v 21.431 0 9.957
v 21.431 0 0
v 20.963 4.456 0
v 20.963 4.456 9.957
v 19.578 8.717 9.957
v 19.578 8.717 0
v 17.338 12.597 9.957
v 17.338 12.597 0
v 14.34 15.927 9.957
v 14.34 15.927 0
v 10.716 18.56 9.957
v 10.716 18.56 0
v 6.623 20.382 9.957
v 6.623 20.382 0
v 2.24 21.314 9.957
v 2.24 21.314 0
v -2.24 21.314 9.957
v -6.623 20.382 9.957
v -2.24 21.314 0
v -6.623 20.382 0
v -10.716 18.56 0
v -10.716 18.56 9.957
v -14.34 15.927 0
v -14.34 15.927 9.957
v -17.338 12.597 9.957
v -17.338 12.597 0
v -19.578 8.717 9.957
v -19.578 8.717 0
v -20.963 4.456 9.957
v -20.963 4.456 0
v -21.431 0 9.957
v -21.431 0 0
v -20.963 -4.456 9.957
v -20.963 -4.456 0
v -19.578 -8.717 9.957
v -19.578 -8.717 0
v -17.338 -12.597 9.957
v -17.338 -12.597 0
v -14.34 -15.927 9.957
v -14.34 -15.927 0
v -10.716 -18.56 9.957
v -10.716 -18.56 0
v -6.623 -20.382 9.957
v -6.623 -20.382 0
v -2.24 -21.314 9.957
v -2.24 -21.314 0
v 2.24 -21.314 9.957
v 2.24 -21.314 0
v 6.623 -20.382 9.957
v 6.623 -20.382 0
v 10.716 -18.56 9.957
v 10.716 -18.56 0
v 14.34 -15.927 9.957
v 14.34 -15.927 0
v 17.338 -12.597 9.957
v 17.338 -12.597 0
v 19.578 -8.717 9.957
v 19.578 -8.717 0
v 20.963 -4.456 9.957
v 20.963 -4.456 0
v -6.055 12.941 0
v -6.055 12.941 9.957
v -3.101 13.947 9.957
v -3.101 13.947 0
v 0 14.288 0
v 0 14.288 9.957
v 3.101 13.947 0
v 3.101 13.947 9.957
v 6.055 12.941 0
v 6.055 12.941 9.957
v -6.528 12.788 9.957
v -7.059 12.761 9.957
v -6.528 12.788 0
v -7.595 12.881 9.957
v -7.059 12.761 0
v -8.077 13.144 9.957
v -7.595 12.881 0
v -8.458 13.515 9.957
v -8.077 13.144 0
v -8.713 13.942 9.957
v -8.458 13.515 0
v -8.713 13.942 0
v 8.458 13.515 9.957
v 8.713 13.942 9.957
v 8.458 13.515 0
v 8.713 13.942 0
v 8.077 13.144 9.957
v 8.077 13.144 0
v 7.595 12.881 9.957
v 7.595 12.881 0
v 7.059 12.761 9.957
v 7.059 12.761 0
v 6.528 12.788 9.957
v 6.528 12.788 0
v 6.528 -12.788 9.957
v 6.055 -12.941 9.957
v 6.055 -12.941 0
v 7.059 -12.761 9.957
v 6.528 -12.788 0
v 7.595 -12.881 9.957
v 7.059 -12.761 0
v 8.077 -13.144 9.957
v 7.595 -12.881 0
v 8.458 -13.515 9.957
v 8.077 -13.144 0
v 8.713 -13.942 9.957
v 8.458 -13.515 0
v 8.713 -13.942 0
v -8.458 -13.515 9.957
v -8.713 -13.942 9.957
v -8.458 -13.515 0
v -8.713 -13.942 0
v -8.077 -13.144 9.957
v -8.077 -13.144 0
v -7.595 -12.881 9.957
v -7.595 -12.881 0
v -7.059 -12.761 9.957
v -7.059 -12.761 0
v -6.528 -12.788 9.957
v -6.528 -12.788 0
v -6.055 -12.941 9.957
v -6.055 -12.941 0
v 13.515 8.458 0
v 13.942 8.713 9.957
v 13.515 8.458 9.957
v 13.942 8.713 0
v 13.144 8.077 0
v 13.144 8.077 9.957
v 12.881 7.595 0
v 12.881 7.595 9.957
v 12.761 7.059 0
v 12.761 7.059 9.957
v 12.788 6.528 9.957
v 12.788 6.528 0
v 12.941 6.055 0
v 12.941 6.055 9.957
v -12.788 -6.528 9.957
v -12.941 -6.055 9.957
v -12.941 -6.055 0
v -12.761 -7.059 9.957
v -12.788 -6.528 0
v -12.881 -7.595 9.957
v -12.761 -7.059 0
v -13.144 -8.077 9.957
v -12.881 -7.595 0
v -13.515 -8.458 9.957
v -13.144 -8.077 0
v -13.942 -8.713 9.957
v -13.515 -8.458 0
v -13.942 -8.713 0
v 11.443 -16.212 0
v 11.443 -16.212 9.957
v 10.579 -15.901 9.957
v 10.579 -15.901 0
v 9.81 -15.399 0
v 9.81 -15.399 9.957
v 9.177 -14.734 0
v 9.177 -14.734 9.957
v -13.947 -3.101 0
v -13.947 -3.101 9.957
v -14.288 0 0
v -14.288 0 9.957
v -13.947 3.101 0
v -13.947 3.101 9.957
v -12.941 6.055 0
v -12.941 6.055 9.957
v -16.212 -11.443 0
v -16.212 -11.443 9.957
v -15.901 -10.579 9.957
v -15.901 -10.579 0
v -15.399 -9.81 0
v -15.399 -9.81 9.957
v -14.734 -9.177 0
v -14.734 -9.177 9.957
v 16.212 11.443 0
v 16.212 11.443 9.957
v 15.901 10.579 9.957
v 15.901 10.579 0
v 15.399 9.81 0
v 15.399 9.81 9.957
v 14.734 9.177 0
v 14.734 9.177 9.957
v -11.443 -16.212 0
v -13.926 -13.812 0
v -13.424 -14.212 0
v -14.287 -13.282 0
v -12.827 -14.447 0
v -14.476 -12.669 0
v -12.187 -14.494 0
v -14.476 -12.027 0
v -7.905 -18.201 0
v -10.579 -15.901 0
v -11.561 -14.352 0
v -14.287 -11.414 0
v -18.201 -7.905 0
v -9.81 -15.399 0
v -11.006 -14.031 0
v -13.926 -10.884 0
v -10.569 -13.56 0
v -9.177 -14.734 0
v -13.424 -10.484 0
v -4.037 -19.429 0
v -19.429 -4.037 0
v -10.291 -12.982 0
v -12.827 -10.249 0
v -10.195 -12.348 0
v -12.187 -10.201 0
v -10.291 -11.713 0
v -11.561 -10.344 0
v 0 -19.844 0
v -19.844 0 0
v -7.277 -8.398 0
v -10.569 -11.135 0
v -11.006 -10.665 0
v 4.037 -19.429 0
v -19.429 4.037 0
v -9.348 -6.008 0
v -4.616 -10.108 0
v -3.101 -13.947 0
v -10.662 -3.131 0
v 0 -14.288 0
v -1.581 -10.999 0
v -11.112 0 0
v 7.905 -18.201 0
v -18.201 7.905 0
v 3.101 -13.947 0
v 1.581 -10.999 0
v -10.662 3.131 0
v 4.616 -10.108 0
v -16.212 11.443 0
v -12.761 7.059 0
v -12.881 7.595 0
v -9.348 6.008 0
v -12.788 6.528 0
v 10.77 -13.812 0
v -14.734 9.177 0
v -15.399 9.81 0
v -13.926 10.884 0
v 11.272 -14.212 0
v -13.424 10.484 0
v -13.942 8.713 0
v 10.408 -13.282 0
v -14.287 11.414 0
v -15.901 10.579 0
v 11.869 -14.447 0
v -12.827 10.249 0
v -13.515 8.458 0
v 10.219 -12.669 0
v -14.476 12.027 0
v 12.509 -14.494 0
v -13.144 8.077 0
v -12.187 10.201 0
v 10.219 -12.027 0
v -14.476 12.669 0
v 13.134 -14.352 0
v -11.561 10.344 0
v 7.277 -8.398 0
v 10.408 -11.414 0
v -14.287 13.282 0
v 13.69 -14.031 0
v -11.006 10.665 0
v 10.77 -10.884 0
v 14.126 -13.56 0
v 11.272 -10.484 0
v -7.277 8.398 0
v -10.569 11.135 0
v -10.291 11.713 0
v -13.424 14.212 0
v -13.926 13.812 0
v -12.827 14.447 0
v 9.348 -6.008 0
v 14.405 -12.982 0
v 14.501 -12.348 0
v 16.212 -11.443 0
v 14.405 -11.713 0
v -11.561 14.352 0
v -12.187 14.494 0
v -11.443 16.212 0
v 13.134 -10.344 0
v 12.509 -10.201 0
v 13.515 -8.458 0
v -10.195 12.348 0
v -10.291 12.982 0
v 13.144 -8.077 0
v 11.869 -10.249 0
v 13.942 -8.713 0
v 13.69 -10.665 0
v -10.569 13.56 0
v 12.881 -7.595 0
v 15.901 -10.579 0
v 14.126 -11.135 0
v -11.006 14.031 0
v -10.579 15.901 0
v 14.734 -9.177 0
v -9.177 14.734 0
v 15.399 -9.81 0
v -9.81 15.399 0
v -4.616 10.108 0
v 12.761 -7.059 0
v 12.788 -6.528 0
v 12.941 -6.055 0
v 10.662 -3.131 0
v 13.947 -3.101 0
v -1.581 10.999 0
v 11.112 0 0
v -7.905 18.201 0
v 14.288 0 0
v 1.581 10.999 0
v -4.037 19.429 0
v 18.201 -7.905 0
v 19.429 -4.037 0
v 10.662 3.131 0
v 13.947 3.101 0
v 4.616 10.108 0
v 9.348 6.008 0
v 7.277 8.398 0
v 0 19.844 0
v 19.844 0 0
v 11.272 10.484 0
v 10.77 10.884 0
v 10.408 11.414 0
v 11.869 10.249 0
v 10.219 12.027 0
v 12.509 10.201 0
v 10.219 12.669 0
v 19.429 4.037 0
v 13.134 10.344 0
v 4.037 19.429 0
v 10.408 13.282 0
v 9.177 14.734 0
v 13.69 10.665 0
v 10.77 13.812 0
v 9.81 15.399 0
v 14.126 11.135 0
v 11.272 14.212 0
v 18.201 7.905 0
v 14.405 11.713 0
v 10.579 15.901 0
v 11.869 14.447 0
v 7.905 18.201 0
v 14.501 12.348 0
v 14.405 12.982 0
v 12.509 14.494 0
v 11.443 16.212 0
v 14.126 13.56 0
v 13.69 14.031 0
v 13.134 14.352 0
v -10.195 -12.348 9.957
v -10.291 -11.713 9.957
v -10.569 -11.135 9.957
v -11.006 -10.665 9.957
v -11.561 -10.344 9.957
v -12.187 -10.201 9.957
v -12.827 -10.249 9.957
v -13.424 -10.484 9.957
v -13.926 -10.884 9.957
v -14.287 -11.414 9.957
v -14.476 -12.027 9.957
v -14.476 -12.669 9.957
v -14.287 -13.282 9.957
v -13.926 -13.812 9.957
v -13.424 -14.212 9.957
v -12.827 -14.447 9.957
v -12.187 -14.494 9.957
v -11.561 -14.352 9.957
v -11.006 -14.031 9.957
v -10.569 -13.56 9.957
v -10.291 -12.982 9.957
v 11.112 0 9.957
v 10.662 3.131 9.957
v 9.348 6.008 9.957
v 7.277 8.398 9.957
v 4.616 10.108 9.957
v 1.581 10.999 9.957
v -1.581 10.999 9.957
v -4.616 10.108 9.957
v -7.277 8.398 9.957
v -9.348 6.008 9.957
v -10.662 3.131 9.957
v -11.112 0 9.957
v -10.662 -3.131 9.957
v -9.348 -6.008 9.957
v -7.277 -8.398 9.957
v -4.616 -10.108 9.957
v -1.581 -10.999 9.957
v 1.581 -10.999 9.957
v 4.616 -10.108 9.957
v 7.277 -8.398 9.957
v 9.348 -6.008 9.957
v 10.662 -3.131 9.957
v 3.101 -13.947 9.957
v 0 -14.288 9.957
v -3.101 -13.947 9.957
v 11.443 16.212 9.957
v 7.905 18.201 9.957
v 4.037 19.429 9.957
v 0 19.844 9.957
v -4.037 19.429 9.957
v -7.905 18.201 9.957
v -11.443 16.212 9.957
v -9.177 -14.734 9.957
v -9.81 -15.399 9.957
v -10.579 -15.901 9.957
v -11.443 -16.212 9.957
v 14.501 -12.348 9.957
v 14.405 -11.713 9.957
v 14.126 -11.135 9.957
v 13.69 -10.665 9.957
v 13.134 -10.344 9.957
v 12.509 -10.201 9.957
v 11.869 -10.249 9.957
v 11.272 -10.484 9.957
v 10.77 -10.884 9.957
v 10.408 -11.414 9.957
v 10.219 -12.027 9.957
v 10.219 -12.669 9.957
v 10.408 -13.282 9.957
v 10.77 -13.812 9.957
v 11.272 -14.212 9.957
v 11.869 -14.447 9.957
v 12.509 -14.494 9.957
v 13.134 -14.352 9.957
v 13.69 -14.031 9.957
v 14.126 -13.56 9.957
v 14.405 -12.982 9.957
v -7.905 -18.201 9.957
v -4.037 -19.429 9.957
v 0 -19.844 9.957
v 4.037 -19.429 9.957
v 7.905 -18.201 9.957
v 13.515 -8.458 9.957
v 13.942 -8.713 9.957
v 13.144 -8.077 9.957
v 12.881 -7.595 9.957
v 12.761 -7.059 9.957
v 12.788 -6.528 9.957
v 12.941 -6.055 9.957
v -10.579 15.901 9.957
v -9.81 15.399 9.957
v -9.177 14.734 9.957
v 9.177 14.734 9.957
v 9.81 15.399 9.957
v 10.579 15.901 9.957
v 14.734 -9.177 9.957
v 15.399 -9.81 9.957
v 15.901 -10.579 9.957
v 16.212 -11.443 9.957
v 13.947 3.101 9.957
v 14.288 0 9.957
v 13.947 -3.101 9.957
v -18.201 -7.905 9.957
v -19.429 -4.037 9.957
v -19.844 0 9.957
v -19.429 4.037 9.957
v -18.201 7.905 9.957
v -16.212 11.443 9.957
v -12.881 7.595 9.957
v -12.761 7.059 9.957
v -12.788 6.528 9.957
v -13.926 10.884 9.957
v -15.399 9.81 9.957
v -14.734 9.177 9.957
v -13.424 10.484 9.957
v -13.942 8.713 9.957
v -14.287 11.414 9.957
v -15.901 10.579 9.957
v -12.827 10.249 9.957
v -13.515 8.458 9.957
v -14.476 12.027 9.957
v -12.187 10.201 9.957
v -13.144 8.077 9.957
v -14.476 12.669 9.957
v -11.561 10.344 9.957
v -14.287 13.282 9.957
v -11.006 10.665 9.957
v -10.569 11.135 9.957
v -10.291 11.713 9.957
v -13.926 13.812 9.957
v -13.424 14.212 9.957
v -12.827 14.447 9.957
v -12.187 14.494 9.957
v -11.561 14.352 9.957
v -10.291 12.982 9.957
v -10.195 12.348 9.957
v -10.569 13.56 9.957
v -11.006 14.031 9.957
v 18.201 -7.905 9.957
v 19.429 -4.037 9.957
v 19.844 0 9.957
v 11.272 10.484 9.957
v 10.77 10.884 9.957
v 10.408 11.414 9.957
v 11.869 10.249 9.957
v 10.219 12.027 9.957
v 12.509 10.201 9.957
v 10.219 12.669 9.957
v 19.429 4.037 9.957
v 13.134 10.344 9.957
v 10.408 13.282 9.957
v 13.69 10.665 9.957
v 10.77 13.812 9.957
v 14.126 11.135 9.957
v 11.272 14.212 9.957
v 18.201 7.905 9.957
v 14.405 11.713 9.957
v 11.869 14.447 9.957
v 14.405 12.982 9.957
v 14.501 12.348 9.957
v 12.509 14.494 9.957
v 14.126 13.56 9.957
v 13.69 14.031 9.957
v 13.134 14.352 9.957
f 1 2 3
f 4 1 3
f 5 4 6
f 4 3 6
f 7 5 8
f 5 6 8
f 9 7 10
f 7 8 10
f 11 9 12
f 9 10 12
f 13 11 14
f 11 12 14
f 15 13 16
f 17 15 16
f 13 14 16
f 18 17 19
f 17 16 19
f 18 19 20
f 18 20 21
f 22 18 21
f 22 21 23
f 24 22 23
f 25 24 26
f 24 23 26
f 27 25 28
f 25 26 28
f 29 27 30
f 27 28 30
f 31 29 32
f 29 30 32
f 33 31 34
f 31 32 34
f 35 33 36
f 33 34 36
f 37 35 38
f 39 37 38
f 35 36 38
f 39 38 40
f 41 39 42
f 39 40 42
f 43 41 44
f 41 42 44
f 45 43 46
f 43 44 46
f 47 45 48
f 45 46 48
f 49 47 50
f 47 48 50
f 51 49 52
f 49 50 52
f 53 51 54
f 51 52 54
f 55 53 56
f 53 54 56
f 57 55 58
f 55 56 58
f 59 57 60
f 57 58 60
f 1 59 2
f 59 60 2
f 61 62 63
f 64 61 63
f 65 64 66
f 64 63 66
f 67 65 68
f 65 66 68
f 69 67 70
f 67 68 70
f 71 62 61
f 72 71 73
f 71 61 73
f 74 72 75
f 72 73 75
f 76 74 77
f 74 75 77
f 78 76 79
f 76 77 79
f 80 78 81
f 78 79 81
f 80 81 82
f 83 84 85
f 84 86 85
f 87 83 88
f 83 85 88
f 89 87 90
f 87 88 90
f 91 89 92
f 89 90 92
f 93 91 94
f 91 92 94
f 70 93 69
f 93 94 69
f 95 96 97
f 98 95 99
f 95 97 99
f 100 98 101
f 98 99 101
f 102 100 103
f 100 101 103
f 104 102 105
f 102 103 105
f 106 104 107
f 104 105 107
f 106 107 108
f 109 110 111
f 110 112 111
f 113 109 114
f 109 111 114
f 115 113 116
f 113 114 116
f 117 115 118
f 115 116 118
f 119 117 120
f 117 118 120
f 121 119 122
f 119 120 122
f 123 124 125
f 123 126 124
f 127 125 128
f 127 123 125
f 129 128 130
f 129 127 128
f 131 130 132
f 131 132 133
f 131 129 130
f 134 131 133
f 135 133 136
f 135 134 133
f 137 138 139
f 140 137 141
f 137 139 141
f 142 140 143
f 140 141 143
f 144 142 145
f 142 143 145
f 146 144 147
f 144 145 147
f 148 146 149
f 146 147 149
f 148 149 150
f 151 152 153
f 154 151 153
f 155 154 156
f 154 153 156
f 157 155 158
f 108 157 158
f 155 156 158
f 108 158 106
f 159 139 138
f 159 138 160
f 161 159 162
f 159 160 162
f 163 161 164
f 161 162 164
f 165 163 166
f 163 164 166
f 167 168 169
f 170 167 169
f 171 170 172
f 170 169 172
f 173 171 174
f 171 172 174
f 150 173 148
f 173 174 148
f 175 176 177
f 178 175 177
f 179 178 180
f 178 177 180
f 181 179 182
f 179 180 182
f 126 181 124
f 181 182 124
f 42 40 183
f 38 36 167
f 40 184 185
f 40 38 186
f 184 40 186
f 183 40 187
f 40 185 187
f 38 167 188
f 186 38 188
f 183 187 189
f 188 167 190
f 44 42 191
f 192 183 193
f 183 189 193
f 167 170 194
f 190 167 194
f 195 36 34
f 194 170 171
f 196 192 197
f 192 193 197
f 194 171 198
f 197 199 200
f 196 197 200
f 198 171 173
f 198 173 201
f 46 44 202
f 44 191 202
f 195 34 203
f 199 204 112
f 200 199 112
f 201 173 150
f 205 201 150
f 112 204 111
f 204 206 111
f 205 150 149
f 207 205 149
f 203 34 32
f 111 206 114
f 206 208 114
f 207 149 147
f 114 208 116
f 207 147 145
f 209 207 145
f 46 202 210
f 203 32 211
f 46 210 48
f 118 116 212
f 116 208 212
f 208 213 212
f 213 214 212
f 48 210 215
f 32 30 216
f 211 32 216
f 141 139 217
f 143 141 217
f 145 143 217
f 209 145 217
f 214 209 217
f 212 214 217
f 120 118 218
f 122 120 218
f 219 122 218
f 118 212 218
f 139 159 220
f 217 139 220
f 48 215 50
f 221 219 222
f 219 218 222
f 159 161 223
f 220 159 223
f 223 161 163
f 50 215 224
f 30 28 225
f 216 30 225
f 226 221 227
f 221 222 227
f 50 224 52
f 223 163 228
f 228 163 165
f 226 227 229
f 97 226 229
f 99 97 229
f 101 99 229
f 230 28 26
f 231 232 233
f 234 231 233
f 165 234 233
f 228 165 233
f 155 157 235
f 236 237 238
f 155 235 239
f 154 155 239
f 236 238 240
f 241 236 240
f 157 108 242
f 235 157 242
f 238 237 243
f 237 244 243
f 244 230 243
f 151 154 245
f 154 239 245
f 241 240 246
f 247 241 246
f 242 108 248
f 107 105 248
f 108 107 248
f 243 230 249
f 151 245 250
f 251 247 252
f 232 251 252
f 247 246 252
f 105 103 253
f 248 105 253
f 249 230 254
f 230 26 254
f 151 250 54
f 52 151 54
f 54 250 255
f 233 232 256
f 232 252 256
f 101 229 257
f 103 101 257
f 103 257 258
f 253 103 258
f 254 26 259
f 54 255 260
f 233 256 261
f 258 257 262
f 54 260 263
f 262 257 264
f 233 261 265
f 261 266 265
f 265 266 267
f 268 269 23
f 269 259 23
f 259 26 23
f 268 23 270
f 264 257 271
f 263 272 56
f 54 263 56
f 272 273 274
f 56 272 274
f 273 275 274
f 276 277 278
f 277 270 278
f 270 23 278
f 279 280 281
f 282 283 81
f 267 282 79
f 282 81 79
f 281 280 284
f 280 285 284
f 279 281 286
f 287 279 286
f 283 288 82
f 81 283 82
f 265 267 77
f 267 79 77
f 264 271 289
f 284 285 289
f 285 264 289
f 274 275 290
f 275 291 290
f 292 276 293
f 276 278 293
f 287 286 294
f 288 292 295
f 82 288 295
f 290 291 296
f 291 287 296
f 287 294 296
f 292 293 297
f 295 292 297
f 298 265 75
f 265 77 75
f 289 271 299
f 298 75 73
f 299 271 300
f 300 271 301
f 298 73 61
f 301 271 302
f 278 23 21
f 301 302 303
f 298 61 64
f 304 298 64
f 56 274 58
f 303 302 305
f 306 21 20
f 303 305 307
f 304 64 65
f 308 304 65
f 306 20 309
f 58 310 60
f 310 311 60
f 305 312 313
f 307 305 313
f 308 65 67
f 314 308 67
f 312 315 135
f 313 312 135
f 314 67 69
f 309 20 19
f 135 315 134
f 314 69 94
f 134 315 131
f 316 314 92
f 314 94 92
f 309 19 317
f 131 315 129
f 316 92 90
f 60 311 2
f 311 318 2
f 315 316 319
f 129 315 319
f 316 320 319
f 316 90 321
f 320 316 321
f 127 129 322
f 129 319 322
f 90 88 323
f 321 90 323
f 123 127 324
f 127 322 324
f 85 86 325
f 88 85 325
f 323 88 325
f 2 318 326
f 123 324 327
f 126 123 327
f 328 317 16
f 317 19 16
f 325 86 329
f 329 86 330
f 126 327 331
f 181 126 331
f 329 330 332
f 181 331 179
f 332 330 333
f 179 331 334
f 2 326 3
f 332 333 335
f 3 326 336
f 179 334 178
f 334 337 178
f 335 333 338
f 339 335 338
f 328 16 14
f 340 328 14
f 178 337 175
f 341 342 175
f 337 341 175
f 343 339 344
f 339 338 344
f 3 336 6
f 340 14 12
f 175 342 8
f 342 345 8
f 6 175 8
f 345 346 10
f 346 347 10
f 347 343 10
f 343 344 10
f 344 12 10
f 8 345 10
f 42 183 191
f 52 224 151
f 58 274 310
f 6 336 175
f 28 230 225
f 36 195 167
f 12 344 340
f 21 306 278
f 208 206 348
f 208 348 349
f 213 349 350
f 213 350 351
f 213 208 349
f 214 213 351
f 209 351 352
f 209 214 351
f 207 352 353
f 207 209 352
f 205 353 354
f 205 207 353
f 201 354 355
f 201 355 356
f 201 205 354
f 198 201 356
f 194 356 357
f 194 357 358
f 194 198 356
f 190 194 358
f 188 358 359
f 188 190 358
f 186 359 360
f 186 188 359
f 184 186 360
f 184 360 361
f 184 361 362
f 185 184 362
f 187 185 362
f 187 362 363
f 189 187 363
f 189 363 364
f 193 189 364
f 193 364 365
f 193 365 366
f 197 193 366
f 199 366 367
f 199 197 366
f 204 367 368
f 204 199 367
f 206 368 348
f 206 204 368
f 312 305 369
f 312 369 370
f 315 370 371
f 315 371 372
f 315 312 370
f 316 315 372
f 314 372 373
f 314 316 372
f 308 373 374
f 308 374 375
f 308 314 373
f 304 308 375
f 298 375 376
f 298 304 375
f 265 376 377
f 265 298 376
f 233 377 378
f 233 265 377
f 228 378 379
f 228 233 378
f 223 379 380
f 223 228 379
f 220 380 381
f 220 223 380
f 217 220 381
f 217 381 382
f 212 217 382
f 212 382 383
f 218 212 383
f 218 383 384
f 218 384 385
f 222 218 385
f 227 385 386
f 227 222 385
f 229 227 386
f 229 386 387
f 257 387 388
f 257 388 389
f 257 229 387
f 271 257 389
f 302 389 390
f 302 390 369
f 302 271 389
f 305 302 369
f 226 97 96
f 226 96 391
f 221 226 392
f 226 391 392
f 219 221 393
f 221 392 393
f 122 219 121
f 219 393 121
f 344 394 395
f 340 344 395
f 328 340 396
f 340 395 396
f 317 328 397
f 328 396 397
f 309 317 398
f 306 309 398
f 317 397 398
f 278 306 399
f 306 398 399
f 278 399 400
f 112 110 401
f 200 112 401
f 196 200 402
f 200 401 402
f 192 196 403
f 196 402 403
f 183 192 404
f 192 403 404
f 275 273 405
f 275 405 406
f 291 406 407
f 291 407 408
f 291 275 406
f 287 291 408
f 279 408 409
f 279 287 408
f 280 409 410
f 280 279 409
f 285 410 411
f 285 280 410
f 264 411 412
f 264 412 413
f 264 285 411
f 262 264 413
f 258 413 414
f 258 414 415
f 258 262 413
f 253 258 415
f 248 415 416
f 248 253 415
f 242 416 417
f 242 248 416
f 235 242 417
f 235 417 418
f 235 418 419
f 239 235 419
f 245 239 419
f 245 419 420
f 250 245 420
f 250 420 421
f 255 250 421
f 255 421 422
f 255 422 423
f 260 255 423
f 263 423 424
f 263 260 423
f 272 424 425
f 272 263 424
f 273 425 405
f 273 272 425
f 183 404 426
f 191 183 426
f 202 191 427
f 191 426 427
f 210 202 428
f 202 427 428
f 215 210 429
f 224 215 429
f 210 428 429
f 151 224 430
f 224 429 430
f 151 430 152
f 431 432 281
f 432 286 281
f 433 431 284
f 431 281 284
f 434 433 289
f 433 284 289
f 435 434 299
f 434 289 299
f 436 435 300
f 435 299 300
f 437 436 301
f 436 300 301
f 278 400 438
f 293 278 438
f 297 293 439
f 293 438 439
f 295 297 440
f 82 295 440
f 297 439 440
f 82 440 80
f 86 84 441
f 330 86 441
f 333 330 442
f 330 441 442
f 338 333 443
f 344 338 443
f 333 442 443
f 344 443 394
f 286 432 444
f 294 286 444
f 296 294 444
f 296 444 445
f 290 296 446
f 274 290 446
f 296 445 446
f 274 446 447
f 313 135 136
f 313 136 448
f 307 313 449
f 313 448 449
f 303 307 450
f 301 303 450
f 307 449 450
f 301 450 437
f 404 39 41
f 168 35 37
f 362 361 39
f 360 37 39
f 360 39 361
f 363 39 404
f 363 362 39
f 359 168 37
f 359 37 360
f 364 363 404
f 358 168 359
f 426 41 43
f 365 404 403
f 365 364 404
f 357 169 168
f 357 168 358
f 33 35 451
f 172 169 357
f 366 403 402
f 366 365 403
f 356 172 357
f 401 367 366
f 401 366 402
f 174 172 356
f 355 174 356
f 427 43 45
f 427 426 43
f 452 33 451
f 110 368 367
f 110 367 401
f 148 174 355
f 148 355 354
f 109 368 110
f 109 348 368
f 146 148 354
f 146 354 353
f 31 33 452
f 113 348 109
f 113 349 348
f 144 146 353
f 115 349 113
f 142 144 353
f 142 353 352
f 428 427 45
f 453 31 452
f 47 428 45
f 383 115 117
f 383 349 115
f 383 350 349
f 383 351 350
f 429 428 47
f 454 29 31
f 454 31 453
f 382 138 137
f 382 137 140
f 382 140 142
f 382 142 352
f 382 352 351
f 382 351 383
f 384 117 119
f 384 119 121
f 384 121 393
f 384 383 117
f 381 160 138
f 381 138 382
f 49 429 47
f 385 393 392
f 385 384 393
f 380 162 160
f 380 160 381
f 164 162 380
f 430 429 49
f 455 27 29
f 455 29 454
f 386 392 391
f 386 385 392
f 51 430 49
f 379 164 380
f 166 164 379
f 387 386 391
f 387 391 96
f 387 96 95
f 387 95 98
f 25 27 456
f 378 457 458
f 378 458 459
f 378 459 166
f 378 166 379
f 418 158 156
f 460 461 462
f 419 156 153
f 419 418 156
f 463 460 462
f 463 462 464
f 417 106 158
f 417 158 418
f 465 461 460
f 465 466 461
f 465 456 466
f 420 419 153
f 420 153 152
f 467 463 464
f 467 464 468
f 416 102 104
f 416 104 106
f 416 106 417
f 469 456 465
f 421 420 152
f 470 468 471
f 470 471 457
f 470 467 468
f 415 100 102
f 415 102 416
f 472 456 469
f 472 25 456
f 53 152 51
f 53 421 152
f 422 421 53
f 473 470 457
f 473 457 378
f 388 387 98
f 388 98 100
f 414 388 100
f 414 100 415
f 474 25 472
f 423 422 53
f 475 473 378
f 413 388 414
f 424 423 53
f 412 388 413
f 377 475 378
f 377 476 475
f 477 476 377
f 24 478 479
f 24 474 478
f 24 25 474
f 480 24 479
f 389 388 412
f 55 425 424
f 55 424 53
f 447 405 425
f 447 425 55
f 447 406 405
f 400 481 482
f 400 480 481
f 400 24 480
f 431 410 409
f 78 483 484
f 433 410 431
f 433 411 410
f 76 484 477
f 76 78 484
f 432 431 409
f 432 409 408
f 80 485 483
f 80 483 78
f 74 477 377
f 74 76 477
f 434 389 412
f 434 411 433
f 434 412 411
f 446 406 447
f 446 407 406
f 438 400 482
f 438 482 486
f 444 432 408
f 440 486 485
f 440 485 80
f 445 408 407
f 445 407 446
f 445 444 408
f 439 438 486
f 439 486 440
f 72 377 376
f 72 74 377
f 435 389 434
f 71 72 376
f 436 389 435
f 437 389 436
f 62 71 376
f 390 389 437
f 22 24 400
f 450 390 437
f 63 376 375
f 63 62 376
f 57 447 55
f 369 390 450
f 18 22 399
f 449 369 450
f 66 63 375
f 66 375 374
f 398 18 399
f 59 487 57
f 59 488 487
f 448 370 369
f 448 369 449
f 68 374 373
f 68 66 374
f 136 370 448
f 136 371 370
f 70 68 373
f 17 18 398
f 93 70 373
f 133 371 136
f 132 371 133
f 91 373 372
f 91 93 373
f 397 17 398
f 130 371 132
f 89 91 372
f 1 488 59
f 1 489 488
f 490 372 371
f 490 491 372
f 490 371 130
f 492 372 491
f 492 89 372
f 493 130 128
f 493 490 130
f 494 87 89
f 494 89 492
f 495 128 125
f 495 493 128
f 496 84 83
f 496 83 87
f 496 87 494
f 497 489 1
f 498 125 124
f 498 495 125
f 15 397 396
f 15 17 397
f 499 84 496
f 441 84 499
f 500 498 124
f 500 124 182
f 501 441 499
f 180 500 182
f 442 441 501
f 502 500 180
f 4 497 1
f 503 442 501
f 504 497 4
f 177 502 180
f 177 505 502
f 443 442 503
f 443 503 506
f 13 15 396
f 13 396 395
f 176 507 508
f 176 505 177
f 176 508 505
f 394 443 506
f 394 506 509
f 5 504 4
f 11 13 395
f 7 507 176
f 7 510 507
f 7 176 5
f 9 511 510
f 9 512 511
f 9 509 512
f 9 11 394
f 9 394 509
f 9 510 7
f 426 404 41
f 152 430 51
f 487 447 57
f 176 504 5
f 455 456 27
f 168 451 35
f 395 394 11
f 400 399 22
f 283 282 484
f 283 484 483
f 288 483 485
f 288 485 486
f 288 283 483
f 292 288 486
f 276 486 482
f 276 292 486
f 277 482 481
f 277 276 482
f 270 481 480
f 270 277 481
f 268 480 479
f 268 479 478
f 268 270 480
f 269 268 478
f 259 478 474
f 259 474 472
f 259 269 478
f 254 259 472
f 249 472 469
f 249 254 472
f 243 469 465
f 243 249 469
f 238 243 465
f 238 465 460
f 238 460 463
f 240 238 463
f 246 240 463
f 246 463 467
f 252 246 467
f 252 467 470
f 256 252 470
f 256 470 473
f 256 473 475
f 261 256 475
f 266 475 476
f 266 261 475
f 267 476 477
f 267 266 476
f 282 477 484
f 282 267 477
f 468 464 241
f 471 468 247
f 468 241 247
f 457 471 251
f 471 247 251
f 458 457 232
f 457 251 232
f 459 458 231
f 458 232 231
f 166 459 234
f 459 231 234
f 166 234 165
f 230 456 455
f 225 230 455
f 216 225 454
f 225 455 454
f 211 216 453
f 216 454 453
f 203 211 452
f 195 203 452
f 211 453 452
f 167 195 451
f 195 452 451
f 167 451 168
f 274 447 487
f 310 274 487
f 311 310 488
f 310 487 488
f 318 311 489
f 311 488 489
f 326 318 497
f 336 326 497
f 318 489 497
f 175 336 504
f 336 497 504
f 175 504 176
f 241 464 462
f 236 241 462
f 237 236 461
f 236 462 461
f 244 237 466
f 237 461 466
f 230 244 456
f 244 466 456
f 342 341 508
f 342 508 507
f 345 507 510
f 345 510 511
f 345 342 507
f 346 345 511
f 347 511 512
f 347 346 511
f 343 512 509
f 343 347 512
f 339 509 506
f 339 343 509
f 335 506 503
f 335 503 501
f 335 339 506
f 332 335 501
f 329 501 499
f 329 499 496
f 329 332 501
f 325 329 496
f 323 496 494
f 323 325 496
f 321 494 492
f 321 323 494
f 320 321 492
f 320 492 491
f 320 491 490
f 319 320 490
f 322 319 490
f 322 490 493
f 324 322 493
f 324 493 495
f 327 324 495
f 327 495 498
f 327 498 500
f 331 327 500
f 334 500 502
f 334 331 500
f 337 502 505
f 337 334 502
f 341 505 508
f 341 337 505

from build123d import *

# Parameters (mm, degrees)
F0_R            = 21.43125
F0_R_2          = 2.15265
F0_R_3          = 11.1125
F1_DEPTH        = 9.9568
F3_DEPTH        = 9.9568
F3_COPIES_COUNT = 4
F4_R            = 1.984375


# Not quite as in the source:
# - a pattern or mirror of a feature is missing from the dataset's text; its kind, count and spacing are read off the source's solid


with BuildPart() as f1:
    # F0 (on Top) → F1 (new body)
    with BuildSketch(Plane.XY):
        Circle(F0_R)
        with Locations((-12.3478521665, -12.3478521665)):
            Circle(F0_R_2, mode=Mode.SUBTRACT)
        with Locations((12.3478521665, -12.3478521665)):
            Circle(F0_R_2, mode=Mode.SUBTRACT)
        with Locations((-12.3478521665, 12.3478521665)):
            Circle(F0_R_2, mode=Mode.SUBTRACT)
        Circle(F0_R_3, mode=Mode.SUBTRACT)
        with Locations((12.3478521665, 12.3478521665)):
            Circle(F0_R_2, mode=Mode.SUBTRACT)
    extrude(amount=F1_DEPTH)

    # F2 (on face) → F3 (cut, through all)
    with BuildSketch(Plane.XY.offset(9.9568)):
        with BuildLine():
            ThreePointArc((8.4692641257, 11.5067033254), (8.9929440308, 14.4681276118), (11.4430257563, 16.212081162))
            ThreePointArc((11.4430257563, 16.212081162), (0, 19.84375), (-11.4430257563, 16.212081162))
            ThreePointArc((-11.4430257563, 16.212081162), (-8.9929440308, 14.4681276118), (-8.4692641257, 11.5067033254))
            ThreePointArc((-8.4692641257, 11.5067033254), (0, 14.2875), (8.4692641257, 11.5067033254))
        make_face()
    f3 = extrude(amount=-F3_DEPTH, mode=Mode.SUBTRACT)

    # F3_copies: F3 ×4 about axis
    f3_copies_axis = Axis((0, 0, 0), (0, 0, 1))
    for i in range(1, F3_COPIES_COUNT):
        add(f3.rotate(f3_copies_axis, i * 360 / F3_COPIES_COUNT), mode=Mode.SUBTRACT)

    # F4
    f4_edges = [f1.edges().sort_by_distance(p)[0] for p in [
        (8.469264, 11.506703, 4.9784),
        (-8.469264, 11.506703, 4.9784),
        (8.469264, -11.506703, 4.9784),
        (-8.469264, -11.506703, 4.9784),
        (11.506703, 8.469264, 4.9784),
        (11.506703, -8.469264, 4.9784),
        (-11.506703, -8.469264, 4.9784),
        (-11.506703, 8.469264, 4.9784),
    ]]
    fillet(f4_edges, radius=F4_R)


solid = f1.part
